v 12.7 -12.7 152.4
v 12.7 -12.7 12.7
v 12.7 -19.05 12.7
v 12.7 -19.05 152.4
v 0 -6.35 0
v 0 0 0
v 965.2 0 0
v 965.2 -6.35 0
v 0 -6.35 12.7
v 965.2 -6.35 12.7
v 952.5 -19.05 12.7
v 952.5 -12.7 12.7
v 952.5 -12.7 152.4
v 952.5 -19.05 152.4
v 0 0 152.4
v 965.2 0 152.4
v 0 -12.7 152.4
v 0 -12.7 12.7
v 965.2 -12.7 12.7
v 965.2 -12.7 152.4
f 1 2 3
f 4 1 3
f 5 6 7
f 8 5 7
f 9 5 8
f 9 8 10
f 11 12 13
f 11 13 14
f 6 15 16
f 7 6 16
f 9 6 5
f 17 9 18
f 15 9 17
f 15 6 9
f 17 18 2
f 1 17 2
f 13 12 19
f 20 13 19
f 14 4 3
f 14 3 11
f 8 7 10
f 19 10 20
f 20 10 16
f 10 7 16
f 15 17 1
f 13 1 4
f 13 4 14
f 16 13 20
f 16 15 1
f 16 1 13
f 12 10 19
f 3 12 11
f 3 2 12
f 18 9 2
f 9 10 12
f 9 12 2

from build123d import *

# Parameters (mm, degrees)
F0_W     = 965.2
F0_H     = 152.4
F1_DEPTH = 19.05
F2_W     = 12.7
F2_H     = 12.7
F3_DEPTH = 965.201
F4_W     = 12.7
F4_H     = 6.35
F5_DEPTH = 152.401
F6_W     = 12.7
F6_H     = 6.35
F7_DEPTH = 152.401


with BuildPart() as f1:
    # F0 (on Front) → F1 (new body)
    with BuildSketch(Plane.XZ):
        with Locations((482.6, 76.2)):
            Rectangle(F0_W, F0_H)
    extrude(amount=F1_DEPTH)

    # F2 (on face) → F3 (cut, through all)
    with BuildSketch(Plane(origin=(0, 0, 0), x_dir=(0, -1, 0), z_dir=(-1, 0, 0))):
        with Locations((12.7, 6.35)):
            Rectangle(F2_W, F2_H)
    extrude(amount=-F3_DEPTH, mode=Mode.SUBTRACT)

    # F4 (on face) → F5 (cut, through all)
    with BuildSketch(Plane(origin=(0, 0, 0), x_dir=(1, 0, 0), z_dir=(0, 0, -1))):
        with Locations((6.35, 15.875)):
            Rectangle(F4_W, F4_H)
    extrude(amount=-F5_DEPTH, mode=Mode.SUBTRACT)

    # F6 (on face) → F7 (cut, through all)
    with BuildSketch(Plane(origin=(0, 0, 0), x_dir=(1, 0, 0), z_dir=(0, 0, -1))):
        with Locations((958.85, 15.875)):
            Rectangle(F6_W, F6_H)
    extrude(amount=-F7_DEPTH, mode=Mode.SUBTRACT)


solid = f1.part
